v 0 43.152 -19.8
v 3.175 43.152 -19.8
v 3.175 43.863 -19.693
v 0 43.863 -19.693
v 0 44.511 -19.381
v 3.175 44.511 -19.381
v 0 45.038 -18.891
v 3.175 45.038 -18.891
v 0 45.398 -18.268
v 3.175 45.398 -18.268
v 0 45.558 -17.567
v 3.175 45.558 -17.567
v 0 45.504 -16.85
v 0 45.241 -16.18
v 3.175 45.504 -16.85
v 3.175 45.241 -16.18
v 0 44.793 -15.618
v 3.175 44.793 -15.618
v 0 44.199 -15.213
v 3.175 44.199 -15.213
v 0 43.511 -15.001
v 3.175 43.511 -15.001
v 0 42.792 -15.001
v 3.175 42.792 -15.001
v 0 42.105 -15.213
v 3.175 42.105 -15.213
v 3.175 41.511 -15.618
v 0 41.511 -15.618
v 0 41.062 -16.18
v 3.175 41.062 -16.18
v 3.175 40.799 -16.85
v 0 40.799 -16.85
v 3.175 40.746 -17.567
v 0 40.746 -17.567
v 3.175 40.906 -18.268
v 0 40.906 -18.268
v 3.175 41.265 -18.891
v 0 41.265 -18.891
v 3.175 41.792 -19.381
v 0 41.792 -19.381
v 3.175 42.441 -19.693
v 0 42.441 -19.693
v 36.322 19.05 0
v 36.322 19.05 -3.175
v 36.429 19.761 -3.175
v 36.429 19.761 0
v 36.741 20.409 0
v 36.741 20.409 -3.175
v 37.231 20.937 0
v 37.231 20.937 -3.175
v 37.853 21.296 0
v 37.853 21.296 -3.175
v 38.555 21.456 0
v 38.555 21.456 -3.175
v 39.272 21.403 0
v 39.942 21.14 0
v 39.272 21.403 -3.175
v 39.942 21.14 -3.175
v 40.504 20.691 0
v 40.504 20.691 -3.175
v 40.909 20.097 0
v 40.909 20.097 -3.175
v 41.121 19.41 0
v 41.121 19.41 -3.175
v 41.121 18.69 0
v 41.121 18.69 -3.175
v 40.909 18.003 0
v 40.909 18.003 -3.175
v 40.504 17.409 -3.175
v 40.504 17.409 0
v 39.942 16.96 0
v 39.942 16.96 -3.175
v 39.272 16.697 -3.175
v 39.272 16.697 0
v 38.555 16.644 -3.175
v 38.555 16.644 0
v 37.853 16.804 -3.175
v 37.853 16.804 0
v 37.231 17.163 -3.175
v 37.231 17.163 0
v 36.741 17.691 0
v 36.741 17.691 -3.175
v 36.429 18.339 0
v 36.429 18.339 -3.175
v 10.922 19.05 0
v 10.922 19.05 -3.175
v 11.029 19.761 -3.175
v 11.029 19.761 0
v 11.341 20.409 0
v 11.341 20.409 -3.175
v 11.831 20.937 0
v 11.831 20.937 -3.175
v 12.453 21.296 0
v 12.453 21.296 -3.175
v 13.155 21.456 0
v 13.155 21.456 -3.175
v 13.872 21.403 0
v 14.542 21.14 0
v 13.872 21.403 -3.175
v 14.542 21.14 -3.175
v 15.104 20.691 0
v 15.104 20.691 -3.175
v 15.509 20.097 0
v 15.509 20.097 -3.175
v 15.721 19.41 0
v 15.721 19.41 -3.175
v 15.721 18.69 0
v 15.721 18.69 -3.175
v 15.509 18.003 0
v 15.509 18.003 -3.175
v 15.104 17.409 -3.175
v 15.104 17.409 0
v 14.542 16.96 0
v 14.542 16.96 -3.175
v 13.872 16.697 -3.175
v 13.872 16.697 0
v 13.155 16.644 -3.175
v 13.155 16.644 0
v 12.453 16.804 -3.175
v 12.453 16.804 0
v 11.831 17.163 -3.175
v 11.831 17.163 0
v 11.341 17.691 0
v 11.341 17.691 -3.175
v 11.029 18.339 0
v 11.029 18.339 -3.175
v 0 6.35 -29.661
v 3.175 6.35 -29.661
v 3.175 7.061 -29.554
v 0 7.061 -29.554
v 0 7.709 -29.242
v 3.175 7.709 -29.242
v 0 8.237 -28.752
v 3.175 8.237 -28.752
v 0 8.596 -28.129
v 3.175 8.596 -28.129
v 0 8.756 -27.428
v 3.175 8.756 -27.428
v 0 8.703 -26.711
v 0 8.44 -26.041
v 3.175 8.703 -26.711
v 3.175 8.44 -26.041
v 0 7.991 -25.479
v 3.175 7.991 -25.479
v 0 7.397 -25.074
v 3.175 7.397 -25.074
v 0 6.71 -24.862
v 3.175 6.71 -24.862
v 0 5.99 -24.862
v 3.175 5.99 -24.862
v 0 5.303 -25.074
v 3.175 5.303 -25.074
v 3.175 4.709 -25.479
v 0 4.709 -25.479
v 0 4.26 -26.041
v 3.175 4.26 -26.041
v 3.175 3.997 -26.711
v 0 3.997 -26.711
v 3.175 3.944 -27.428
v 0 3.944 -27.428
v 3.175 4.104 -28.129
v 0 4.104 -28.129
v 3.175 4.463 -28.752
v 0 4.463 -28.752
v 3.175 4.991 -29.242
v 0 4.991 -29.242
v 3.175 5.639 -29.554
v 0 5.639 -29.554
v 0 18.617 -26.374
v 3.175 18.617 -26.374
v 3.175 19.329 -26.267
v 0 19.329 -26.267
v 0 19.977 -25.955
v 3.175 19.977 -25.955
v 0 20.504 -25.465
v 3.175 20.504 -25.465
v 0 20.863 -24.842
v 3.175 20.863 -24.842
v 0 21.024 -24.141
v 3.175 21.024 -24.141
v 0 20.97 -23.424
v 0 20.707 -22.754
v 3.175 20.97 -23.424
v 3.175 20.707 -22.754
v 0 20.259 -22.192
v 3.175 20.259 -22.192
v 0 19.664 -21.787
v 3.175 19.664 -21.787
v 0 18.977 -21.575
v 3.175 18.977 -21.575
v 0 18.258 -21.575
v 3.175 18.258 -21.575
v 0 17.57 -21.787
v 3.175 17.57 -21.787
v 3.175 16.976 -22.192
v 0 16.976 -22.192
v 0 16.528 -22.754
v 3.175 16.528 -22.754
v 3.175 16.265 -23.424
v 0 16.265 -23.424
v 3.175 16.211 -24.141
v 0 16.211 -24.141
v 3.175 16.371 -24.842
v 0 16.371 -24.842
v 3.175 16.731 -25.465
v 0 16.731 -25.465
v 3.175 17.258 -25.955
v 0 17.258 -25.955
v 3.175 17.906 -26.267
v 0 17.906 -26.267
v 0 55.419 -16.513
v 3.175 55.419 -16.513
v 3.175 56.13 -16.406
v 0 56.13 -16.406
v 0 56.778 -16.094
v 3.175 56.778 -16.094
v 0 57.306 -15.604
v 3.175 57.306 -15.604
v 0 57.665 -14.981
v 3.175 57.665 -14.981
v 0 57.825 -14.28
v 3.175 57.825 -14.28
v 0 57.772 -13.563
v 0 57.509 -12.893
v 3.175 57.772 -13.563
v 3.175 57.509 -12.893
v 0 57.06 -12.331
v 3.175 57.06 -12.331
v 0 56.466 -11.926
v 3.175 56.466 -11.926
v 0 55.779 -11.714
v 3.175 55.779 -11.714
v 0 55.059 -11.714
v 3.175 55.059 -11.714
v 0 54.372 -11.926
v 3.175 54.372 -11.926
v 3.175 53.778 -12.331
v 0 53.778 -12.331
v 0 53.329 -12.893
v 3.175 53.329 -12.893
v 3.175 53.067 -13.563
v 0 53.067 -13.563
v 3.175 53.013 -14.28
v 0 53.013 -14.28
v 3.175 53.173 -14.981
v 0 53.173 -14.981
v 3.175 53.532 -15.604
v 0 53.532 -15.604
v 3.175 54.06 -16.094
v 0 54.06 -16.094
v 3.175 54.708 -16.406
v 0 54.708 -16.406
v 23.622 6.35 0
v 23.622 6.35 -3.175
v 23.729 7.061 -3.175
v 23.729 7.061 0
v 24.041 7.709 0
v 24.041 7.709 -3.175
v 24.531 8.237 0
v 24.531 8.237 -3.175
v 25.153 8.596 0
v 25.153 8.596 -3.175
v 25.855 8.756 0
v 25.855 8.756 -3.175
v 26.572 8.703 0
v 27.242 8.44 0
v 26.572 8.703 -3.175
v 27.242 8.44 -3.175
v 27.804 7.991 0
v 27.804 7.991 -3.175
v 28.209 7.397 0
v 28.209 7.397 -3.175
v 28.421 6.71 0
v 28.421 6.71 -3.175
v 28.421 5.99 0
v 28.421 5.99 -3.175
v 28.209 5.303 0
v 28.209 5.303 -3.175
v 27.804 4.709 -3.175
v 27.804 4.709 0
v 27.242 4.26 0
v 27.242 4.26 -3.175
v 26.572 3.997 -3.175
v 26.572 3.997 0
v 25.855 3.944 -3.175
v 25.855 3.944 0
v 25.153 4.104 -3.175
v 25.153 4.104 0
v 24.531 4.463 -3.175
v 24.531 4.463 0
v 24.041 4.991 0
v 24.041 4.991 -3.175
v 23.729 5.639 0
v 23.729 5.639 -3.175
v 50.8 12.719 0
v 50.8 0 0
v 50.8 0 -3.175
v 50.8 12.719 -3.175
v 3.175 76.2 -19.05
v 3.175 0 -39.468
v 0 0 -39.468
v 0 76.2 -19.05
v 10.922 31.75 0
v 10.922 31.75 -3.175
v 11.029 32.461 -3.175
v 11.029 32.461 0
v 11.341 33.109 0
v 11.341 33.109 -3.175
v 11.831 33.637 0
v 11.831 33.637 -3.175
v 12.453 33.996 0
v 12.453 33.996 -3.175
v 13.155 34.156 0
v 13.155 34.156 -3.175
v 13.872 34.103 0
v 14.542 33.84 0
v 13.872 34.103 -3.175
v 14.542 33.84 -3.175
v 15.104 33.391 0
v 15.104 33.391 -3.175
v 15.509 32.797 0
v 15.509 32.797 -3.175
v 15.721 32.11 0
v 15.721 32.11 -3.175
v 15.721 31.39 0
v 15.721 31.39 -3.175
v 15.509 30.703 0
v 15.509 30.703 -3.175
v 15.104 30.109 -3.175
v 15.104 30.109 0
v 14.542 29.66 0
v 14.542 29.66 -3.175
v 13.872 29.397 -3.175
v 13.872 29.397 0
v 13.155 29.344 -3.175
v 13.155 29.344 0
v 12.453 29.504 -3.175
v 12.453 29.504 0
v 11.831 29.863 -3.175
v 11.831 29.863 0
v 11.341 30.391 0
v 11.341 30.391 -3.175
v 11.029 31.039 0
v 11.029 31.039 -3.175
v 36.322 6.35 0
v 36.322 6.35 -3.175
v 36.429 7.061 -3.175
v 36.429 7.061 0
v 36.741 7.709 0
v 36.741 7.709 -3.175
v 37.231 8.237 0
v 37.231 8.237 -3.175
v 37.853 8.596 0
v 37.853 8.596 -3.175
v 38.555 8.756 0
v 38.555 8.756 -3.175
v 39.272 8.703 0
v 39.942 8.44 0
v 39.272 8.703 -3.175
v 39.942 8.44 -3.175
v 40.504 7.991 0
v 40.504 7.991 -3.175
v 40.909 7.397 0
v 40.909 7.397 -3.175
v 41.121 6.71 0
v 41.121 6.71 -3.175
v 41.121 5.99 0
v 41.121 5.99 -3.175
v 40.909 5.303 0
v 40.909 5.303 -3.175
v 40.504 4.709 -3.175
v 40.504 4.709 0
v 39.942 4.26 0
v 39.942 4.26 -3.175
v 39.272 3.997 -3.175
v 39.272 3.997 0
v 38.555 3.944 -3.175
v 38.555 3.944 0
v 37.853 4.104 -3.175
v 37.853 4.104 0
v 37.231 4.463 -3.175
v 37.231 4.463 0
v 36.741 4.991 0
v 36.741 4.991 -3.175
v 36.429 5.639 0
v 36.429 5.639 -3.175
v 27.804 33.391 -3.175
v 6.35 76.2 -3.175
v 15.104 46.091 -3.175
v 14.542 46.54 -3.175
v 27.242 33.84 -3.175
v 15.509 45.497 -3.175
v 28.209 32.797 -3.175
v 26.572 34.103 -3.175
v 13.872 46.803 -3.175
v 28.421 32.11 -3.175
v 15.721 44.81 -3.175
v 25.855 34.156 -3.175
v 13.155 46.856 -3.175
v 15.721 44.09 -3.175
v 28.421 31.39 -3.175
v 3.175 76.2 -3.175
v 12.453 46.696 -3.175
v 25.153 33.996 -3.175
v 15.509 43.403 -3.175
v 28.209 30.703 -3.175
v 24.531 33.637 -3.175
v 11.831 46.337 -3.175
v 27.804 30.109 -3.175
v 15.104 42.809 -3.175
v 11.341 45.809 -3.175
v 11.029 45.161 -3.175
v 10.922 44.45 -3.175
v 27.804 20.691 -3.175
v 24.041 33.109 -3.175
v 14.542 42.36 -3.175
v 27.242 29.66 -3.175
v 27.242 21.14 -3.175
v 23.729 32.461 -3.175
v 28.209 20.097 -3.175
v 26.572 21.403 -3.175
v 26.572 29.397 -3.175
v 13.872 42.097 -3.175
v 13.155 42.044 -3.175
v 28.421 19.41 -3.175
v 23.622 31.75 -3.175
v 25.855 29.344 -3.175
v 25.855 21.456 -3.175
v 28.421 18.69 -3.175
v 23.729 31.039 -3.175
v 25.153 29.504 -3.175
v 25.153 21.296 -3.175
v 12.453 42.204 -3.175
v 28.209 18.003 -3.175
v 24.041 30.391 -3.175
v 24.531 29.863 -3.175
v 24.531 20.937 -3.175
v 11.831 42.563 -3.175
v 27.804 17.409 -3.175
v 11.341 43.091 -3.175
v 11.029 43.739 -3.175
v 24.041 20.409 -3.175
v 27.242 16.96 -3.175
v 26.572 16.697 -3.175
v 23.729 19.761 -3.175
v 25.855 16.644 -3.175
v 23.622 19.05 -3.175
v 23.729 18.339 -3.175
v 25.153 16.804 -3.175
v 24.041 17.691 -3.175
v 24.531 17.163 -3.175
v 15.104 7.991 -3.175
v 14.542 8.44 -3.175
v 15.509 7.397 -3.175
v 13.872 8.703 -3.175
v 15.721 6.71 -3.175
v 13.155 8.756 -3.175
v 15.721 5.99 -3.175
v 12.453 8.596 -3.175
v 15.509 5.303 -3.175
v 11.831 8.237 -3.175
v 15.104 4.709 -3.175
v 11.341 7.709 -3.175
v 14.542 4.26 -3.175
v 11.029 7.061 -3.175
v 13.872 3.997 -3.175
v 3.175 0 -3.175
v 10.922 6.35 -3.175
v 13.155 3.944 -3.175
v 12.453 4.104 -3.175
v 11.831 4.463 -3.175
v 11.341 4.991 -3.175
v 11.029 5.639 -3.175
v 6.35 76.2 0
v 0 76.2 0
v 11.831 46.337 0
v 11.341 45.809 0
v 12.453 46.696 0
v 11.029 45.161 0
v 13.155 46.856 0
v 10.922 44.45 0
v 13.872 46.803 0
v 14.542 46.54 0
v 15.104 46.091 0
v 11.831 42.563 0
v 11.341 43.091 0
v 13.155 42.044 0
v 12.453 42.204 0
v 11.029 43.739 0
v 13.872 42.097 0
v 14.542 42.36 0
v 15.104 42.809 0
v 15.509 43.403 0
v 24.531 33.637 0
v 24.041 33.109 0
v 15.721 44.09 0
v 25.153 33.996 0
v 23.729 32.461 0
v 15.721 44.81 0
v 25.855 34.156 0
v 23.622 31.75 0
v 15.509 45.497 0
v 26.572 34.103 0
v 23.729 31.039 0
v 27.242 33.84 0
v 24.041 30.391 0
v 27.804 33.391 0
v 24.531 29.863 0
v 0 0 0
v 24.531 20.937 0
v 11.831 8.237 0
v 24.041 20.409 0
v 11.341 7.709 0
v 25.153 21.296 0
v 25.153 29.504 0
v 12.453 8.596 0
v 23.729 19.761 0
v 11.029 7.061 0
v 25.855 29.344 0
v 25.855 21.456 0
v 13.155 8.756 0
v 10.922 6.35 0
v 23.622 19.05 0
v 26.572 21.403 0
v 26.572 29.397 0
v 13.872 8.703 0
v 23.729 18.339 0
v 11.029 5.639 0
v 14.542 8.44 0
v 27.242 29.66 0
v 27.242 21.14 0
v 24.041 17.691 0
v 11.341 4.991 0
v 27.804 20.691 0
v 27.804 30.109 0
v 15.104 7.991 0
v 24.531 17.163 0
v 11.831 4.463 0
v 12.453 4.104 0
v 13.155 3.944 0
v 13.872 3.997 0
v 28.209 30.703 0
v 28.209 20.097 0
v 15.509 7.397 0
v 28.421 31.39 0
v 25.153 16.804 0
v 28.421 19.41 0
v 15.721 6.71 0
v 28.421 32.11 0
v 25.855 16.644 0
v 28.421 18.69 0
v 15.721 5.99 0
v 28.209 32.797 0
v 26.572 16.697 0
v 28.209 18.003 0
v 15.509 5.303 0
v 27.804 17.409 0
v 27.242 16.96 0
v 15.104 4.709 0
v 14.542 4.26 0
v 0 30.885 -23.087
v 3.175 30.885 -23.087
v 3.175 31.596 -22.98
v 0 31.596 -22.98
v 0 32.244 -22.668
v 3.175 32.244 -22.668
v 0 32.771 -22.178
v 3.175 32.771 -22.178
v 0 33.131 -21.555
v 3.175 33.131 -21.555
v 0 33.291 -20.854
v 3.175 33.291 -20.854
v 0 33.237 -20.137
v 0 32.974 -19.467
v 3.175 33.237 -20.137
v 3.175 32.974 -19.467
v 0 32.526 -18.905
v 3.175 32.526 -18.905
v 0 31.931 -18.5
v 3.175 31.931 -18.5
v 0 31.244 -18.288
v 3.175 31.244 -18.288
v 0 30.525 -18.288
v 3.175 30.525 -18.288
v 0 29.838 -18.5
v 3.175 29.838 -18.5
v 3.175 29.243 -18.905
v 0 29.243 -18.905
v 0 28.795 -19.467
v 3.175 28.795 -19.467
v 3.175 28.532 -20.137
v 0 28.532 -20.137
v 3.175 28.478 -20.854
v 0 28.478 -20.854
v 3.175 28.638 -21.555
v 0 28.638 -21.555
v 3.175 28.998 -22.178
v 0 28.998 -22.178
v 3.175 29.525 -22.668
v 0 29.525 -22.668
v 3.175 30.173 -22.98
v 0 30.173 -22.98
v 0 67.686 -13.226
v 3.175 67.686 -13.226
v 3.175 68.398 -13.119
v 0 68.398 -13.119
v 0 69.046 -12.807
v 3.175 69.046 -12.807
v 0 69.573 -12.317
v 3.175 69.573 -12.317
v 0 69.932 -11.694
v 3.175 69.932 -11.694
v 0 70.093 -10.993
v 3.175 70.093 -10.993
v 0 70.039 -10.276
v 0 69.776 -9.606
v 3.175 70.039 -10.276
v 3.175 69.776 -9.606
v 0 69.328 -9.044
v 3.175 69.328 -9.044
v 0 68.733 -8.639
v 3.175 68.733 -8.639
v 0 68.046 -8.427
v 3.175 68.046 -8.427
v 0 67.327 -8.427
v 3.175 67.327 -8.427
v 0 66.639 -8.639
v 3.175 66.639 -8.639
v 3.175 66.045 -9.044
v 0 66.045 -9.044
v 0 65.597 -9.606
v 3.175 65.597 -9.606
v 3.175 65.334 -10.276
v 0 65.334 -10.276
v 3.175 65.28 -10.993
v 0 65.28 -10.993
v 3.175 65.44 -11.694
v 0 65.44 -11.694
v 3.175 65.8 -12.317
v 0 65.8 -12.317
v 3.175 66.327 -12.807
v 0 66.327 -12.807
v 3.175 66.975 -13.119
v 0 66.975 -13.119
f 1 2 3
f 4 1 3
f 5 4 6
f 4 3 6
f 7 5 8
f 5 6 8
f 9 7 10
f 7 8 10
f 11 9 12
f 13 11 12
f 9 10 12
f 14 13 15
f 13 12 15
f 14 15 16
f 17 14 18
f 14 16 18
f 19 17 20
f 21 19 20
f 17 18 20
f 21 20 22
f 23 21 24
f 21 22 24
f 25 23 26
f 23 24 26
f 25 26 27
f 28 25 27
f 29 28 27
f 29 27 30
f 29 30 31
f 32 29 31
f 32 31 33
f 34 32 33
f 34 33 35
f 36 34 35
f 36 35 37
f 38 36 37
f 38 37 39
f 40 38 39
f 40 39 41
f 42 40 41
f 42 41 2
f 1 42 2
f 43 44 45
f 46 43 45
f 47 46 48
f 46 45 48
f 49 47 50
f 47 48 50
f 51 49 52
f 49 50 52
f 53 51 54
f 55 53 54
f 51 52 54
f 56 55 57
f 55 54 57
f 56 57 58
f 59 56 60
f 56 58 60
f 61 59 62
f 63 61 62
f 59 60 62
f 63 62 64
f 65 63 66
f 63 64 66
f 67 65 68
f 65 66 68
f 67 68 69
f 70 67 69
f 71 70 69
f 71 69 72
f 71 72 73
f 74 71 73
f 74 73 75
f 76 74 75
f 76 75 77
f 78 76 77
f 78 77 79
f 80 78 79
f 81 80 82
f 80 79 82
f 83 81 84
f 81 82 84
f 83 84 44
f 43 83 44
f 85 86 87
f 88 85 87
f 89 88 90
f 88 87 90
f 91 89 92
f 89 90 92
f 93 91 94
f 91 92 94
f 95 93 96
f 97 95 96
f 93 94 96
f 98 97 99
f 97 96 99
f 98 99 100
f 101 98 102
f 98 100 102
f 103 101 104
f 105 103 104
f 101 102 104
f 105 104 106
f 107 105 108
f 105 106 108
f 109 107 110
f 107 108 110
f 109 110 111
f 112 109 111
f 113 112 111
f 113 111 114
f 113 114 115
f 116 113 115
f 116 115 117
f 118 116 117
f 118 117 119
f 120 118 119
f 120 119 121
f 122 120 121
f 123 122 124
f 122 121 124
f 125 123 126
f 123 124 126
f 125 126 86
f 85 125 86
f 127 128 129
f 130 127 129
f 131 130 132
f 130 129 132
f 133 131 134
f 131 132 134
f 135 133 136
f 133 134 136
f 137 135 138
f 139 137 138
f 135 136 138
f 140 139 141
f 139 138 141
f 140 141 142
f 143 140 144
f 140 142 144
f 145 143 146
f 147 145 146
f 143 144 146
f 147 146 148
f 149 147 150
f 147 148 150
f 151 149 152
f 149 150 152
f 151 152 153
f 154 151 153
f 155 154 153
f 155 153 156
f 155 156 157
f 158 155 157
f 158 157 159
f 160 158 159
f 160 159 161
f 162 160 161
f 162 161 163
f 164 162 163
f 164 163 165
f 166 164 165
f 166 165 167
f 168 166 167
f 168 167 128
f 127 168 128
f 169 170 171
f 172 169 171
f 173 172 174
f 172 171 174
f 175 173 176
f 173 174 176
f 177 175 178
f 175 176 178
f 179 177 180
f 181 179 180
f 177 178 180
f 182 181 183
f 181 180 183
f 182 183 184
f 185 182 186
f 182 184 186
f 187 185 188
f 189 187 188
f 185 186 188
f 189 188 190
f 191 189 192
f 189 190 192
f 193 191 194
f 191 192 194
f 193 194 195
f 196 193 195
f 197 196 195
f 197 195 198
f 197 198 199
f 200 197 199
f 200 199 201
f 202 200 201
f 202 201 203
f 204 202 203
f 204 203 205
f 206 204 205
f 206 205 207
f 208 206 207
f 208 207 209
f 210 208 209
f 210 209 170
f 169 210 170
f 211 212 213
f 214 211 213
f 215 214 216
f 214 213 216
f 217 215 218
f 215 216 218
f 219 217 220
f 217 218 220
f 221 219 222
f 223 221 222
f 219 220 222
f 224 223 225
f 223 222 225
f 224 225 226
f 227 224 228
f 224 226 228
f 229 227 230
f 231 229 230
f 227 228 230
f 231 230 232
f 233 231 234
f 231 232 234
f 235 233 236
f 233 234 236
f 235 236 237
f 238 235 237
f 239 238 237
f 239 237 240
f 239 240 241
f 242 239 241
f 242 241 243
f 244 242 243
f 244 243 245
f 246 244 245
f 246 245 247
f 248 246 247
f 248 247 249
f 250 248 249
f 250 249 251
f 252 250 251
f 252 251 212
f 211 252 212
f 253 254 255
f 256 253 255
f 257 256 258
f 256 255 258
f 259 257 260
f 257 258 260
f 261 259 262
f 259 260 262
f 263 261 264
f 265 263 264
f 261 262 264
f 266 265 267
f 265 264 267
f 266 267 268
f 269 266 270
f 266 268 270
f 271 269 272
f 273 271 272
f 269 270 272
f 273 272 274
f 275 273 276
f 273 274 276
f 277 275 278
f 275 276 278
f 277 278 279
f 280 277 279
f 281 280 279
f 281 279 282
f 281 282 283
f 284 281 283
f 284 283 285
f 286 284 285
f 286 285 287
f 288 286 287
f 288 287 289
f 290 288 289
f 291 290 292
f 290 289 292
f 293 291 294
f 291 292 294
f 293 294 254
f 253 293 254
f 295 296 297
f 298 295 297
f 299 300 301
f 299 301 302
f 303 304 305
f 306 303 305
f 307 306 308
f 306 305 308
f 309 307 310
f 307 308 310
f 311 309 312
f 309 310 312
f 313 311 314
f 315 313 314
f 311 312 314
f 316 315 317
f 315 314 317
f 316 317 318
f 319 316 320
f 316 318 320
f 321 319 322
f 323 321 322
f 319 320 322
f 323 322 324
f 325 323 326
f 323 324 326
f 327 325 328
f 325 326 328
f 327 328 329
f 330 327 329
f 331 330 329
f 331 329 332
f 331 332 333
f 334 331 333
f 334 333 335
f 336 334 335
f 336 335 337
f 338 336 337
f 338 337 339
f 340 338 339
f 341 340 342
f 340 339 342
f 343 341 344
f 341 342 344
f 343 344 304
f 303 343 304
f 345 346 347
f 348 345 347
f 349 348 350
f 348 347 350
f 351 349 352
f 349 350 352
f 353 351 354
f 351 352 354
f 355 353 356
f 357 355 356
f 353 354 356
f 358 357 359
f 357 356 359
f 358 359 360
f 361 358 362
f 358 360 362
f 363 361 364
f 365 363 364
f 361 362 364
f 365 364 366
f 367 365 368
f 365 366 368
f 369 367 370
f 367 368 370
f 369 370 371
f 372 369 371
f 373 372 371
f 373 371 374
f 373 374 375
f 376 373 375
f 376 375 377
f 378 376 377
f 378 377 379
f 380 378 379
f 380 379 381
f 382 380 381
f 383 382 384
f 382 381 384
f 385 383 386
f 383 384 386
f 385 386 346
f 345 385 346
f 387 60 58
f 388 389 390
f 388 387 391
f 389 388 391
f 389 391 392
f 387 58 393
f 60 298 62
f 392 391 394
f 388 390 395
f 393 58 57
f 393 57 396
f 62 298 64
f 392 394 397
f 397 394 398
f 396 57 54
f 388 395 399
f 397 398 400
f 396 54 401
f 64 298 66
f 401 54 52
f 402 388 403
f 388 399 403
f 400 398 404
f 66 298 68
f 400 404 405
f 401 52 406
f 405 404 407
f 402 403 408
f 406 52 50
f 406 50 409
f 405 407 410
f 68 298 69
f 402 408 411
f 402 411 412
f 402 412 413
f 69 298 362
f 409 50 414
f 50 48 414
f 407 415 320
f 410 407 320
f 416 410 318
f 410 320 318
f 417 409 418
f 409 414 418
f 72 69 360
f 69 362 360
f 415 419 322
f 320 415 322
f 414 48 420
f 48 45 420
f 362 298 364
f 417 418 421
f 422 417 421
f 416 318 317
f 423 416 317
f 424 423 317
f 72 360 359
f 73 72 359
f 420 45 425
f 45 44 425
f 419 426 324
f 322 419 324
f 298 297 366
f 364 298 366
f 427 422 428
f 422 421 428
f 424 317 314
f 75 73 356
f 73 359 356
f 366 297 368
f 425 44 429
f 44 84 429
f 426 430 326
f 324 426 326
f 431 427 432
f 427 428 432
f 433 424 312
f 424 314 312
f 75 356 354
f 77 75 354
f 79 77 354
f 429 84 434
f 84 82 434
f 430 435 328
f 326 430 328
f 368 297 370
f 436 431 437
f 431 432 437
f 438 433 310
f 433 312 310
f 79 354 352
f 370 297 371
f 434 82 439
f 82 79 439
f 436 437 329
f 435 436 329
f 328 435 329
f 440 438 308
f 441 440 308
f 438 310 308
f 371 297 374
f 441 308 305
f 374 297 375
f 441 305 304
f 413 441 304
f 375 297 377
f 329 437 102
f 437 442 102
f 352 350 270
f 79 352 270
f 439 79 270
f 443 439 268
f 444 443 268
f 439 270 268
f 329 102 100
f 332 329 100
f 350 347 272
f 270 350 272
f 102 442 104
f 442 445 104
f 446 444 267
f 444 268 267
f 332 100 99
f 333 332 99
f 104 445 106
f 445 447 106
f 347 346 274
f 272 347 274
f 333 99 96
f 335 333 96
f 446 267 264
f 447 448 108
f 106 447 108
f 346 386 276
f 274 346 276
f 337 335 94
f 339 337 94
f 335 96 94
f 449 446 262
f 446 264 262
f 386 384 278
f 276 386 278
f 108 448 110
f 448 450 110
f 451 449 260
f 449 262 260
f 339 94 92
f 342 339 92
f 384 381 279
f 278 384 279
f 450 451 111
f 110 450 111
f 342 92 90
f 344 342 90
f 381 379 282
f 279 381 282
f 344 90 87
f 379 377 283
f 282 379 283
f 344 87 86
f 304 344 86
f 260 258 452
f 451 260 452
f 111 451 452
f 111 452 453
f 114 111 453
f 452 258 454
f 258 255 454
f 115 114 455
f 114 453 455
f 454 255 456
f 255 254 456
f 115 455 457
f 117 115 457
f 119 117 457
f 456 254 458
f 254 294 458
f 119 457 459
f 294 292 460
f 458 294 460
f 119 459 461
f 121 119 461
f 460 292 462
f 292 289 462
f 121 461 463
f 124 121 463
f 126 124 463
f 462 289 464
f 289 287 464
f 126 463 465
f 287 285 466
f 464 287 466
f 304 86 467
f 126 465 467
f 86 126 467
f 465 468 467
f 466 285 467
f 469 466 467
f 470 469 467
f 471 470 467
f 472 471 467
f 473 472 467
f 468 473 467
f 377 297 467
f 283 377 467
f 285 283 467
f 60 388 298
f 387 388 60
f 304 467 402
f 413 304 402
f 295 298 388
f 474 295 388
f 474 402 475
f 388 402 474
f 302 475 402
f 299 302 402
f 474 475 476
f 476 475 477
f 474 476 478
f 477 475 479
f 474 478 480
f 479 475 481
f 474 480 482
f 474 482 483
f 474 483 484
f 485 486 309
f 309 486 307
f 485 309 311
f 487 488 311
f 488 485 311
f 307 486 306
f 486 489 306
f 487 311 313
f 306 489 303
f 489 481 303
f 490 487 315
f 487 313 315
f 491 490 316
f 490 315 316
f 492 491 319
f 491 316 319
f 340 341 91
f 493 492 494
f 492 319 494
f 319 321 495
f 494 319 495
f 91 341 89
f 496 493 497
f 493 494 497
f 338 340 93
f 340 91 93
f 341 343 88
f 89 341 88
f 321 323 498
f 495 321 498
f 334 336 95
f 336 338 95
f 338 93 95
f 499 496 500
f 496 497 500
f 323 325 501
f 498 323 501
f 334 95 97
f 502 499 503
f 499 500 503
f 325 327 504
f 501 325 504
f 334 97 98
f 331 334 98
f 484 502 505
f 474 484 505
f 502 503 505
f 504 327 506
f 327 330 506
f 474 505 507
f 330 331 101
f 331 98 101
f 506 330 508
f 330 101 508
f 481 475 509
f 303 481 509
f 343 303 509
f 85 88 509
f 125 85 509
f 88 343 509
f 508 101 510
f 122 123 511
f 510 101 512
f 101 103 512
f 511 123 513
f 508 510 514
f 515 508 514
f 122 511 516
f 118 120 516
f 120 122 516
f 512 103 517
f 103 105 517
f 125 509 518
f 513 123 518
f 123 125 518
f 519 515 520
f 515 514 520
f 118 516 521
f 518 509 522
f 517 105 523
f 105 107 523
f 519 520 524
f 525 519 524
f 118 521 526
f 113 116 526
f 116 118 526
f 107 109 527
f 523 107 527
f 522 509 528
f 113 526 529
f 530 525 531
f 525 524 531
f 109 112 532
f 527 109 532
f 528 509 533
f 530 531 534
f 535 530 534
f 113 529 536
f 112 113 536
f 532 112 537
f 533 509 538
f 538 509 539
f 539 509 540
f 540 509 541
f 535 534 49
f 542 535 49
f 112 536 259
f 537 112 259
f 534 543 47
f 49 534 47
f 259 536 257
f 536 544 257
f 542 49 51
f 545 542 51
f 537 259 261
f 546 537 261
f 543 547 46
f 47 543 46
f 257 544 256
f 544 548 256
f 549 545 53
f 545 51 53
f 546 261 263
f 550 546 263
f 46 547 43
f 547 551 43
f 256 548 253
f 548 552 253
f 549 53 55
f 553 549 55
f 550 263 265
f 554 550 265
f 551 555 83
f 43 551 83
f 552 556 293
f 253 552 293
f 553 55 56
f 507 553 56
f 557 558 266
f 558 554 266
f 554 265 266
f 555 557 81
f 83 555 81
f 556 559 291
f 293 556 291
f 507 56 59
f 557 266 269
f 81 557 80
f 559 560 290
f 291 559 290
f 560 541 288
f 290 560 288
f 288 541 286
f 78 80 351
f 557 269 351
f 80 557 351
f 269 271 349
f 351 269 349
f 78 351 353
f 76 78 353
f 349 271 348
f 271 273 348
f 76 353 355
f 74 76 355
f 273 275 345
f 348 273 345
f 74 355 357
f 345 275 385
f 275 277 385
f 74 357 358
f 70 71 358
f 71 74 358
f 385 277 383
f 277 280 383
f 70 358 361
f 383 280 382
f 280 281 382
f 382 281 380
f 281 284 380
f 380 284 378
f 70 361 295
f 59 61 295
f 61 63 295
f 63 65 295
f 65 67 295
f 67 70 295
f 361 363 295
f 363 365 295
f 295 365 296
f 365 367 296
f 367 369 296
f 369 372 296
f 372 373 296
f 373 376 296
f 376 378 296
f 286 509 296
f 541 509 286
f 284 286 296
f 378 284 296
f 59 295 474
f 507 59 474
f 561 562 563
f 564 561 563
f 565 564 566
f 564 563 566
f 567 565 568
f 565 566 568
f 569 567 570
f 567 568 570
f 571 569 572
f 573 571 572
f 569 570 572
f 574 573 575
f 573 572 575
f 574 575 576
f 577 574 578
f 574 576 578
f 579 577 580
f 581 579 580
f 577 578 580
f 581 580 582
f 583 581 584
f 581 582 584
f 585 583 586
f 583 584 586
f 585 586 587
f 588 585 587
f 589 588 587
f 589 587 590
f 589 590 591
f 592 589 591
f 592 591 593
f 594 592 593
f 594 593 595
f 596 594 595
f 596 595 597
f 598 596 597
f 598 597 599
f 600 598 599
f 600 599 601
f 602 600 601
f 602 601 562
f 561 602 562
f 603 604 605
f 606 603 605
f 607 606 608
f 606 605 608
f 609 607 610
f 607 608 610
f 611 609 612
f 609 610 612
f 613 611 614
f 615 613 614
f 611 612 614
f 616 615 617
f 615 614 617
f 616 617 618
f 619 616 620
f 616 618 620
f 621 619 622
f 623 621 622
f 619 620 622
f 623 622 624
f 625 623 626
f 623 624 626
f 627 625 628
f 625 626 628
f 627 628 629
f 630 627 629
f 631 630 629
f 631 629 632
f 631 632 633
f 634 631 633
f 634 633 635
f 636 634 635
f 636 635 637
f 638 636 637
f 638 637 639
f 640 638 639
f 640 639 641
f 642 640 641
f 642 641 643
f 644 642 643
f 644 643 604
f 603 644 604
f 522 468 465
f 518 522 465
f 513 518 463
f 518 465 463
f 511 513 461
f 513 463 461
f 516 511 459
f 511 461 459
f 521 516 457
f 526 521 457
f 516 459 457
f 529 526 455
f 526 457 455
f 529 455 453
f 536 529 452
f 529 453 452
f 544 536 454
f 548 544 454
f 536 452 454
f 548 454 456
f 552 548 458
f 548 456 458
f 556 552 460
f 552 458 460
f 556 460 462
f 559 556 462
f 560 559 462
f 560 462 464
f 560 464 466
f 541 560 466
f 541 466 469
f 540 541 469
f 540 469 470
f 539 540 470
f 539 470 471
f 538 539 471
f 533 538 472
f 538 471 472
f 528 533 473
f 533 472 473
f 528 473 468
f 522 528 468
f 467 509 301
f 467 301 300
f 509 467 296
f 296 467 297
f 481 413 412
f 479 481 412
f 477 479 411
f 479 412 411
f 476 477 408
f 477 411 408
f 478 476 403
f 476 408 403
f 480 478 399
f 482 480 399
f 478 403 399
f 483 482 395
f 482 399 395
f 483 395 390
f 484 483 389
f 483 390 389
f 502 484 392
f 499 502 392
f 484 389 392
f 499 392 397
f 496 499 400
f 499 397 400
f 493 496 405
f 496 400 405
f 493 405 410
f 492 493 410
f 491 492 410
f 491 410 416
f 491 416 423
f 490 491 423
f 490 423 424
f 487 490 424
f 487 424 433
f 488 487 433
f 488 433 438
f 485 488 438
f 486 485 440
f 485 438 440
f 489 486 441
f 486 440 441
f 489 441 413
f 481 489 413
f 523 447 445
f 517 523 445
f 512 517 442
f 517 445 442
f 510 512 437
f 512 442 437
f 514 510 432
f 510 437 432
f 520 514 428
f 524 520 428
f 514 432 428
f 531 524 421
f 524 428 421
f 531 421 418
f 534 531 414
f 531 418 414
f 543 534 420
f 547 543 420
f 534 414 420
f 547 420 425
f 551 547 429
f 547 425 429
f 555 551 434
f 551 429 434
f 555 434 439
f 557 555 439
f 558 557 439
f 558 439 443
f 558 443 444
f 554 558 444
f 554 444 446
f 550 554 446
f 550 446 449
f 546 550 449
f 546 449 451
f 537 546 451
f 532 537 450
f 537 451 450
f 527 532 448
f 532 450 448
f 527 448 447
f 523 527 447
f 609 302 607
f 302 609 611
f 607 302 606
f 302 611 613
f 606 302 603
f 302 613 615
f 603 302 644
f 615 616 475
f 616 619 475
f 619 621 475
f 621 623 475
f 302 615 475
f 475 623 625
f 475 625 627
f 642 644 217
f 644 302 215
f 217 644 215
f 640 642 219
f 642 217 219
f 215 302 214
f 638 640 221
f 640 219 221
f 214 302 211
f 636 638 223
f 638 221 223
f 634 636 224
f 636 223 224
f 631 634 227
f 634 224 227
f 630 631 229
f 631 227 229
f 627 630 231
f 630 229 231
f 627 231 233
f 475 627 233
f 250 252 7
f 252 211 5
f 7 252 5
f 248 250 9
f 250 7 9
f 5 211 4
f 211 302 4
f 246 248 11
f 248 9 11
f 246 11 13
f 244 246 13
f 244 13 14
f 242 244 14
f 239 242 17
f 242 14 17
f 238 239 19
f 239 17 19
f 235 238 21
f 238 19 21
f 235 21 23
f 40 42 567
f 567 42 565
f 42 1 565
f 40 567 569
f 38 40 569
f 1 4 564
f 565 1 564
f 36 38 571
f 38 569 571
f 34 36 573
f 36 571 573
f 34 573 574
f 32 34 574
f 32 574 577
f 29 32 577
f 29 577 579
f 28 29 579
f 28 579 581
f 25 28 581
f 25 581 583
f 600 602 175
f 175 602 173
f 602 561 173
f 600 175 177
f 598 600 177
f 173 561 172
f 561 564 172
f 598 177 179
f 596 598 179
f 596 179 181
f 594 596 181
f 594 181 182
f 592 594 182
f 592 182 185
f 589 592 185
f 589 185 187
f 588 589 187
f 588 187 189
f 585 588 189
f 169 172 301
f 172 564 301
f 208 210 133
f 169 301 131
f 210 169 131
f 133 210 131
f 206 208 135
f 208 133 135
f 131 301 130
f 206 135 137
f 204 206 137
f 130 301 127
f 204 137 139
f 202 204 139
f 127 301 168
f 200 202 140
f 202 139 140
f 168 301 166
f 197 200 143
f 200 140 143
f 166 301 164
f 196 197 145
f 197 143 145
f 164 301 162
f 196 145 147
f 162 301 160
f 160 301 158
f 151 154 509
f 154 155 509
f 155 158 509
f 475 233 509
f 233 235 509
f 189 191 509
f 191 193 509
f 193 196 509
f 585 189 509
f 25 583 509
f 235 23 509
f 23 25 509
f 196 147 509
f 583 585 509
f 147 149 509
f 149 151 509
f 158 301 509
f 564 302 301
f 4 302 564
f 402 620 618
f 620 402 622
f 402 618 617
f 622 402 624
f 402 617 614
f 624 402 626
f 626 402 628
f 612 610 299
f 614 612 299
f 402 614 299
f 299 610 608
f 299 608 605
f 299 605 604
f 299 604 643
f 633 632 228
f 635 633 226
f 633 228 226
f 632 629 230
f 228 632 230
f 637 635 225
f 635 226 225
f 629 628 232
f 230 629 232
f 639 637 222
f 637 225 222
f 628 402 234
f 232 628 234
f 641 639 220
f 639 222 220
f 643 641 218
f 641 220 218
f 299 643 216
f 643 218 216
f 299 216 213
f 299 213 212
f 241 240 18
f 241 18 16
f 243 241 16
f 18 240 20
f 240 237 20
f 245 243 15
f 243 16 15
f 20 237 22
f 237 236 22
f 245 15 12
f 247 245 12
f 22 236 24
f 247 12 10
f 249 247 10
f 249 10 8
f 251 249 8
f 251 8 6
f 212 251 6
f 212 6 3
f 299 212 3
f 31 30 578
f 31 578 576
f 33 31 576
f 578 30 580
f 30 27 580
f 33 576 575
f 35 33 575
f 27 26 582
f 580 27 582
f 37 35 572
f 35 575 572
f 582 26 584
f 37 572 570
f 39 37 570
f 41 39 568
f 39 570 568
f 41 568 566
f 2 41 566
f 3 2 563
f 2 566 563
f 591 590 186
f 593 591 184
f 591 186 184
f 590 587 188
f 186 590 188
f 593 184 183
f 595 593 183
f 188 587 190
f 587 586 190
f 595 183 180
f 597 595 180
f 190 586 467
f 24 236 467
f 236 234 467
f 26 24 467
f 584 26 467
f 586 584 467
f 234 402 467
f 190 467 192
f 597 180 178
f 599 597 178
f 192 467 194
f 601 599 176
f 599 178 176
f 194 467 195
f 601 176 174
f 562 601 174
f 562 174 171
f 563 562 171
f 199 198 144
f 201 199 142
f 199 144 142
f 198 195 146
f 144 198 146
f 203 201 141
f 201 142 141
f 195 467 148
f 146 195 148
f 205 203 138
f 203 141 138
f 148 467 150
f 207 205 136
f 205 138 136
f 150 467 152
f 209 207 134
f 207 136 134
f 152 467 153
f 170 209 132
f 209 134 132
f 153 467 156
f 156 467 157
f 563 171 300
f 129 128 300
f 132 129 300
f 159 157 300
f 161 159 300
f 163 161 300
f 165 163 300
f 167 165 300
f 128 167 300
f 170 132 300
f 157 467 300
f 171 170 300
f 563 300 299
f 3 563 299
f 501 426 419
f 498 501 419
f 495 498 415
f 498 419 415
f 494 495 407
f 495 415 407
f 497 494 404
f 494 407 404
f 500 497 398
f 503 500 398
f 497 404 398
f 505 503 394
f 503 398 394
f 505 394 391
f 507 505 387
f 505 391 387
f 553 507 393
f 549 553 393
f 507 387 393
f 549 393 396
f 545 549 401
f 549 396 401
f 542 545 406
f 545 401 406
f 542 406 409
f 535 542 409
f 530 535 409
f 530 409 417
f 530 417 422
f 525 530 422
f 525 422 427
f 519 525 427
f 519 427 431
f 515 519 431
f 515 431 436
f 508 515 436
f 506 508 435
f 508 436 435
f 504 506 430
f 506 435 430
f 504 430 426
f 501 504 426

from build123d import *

# Parameters (mm, degrees)
BOSS_EXTRUDE1_DEPTH = 76.2
SKETCH2_R           = 2.413
CUT_EXTRUDE1_DEPTH  = 3.175
SKETCH4_R           = 2.413
CUT_EXTRUDE2_DEPTH  = 104.224128115


with BuildPart() as part:
    # Sketch1 → Boss-Extrude1 (new body)
    with BuildSketch(Plane(origin=(0, 0, 0), x_dir=(1, 0, 0), z_dir=(0, 1, 0))):
        Polygon((0, 50.8), (0, 0), (50.8, 0), (50.8, 3.175), (3.175, 3.175), (3.175, 50.8), align=None)
    extrude(amount=BOSS_EXTRUDE1_DEPTH)

    # Sketch2 → Cut-Extrude1 (cut)
    with BuildSketch(Plane(origin=(0, 0, -3.175), x_dir=(-1, 0, 0), z_dir=(0, 0, -1))):
        Polygon((-50.8, 12.7188211), (-6.35, 76.2), (-50.8, 76.2), align=None)
        with Locations((-13.335, 6.35)):
            Circle(SKETCH2_R)
        with Locations((-26.035, 6.35)):
            Circle(SKETCH2_R)
        with Locations((-13.335, 19.05)):
            Circle(SKETCH2_R)
        with Locations((-13.335, 31.75)):
            Circle(SKETCH2_R)
        with Locations((-13.335, 44.45)):
            Circle(SKETCH2_R)
        with Locations((-26.035, 19.05)):
            Circle(SKETCH2_R)
        with Locations((-26.035, 31.75)):
            Circle(SKETCH2_R)
        with Locations((-38.735, 19.05)):
            Circle(SKETCH2_R)
        with Locations((-38.735, 6.35)):
            Circle(SKETCH2_R)
    extrude(amount=-CUT_EXTRUDE1_DEPTH, mode=Mode.SUBTRACT)

    # Sketch4 → Cut-Extrude2 (cut, through all)
    with BuildSketch(Plane(origin=(3.175, 0, 0), x_dir=(0, 0, -1), z_dir=(1, 0, 0))):
        with Locations((27.247845098, 6.35)):
            Circle(SKETCH4_R)
        with Locations((23.960843226, 18.617257994)):
            Circle(SKETCH4_R)
        with Locations((20.673841353, 30.884515988)):
            Circle(SKETCH4_R)
        with Locations((17.38683948, 43.151773982)):
            Circle(SKETCH4_R)
        with Locations((14.099837607, 55.419031975)):
            Circle(SKETCH4_R)
        with Locations((10.812835734, 67.686289969)):
            Circle(SKETCH4_R)
        Polygon((19.05, 76.2), (50.8, 76.2), (50.8, -42.29261314), align=None)
    extrude(amount=-CUT_EXTRUDE2_DEPTH, mode=Mode.SUBTRACT)


solid = part.part
